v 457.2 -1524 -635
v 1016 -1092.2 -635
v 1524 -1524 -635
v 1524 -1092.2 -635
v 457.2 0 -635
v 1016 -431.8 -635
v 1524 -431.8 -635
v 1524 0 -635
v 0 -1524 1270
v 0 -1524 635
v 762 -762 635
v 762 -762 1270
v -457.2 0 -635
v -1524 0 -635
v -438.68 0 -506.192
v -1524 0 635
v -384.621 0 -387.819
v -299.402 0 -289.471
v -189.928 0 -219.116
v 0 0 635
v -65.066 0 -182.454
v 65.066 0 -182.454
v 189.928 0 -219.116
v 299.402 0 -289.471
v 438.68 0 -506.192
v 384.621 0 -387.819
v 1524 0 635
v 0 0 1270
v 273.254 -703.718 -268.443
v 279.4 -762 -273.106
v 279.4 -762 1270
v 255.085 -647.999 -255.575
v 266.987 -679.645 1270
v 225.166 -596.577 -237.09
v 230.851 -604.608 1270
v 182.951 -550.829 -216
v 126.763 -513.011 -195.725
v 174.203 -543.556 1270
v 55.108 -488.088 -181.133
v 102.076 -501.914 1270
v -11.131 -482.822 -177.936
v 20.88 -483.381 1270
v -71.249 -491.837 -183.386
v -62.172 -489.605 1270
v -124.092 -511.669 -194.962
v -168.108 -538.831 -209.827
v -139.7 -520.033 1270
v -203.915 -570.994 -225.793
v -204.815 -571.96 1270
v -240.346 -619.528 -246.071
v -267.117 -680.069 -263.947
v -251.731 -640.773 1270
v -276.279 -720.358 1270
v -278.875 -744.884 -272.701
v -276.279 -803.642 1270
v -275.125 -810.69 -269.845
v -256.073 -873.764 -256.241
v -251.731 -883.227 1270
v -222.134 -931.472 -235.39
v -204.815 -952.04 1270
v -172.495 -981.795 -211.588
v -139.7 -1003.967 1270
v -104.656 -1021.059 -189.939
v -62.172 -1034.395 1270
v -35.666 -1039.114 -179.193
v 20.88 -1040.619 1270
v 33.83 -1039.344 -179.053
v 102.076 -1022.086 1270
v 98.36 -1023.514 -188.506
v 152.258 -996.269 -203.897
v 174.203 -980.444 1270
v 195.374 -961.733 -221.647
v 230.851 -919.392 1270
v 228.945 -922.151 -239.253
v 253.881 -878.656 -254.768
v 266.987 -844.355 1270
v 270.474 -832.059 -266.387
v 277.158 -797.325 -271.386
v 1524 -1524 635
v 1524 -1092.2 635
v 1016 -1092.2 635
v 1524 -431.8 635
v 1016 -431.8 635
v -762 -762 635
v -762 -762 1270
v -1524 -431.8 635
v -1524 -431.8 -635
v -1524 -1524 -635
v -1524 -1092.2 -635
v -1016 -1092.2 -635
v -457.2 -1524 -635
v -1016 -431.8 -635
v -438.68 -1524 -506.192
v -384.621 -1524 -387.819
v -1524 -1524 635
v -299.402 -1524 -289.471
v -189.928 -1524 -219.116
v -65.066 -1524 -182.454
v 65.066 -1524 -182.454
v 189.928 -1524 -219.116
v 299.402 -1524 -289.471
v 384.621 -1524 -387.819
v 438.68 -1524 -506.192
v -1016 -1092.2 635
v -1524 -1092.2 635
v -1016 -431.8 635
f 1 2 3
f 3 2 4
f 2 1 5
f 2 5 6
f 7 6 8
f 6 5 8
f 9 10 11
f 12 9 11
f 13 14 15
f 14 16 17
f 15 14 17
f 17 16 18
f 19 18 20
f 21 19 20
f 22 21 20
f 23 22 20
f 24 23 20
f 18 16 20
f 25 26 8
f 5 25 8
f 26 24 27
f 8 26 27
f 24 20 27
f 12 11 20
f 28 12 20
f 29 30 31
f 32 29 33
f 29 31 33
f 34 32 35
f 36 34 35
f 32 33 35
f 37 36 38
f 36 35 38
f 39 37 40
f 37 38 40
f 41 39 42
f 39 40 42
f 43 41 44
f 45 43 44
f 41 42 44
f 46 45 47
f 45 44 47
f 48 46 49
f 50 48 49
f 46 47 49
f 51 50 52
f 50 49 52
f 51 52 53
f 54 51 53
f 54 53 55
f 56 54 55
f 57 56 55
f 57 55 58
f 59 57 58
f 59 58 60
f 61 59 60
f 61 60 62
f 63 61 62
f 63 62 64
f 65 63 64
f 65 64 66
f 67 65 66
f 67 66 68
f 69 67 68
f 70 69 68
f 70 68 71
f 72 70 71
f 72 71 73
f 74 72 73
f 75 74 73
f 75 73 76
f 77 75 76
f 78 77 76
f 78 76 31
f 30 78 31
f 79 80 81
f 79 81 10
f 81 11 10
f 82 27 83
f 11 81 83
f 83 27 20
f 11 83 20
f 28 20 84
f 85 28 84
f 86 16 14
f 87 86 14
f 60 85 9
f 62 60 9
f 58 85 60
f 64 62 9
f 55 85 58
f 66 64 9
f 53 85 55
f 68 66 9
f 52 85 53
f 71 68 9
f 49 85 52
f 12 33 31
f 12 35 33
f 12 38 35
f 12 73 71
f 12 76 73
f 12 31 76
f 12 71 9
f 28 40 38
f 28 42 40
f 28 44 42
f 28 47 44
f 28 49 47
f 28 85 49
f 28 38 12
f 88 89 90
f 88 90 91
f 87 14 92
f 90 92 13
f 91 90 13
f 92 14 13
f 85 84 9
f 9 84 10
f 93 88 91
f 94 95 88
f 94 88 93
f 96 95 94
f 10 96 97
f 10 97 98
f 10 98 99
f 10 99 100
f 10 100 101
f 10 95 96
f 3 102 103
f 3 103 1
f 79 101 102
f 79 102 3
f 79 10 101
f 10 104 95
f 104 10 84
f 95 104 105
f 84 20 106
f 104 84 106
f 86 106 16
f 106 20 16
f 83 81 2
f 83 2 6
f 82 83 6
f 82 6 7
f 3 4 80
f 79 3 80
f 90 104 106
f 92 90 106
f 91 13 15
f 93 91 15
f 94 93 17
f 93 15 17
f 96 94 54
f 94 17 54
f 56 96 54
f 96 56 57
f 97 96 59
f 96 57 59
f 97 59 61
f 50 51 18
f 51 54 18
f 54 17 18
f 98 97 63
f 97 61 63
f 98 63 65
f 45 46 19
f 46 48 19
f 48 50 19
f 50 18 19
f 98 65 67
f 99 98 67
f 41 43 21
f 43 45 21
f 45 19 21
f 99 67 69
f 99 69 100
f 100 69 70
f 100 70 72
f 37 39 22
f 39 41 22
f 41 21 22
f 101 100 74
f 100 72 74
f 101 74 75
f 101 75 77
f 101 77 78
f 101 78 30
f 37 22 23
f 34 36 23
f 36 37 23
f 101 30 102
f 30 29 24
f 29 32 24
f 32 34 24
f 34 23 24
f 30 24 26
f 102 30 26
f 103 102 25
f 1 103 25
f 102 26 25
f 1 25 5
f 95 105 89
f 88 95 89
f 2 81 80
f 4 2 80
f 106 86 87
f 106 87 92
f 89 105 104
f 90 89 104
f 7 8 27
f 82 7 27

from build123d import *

# Parameters (mm, degrees)
F1_DEPTH  = 1524
F2_W      = 508
F2_H      = 660.4
F3_DEPTH  = 25.4
F3_FACE_W = 508
F3_FACE_H = 660.4
F4_DEPTH  = 1295.401
F6_DEPTH  = 635
F7_R      = 279.4
F8_DEPTH  = 1905.001


with BuildPart() as f1:
    # F0 (on Front) → F1 (new body)
    with BuildSketch(Plane.XZ):
        with BuildLine():
            Line((-1524, 635), (-1524, -635))
            Line((-1524, -635), (-457.2, -635))
            ThreePointArc((-457.2, -635), (0, -177.8), (457.2, -635))
            Line((457.2, -635), (1524, -635))
            Line((1524, -635), (1524, 635))
            Line((1524, 635), (-1524, 635))
        make_face()
    extrude(amount=F1_DEPTH)

    # F2 (on face) → F3 (join)
    with BuildSketch(Plane.XY.offset(635)):
        with Locations((-1270, -762)):
            Rectangle(F2_W, F2_H)
        with Locations((1270, -762)):
            Rectangle(F2_W, F2_H)
    extrude(amount=F3_DEPTH)

    # F3_face (on face) → F4 (cut, through all)
    with BuildSketch(Plane(origin=(-1270, -762, 660.4), x_dir=(1, 0, 0), z_dir=(0, 0, 1))):
        Rectangle(F3_FACE_W, F3_FACE_H)
        with Locations((2540, 0)):
            Rectangle(F3_FACE_W, F3_FACE_H)
    extrude(amount=-F4_DEPTH, mode=Mode.SUBTRACT)

    # F5 (on face) → F6 (join)
    with BuildSketch(Plane.XY.offset(635)):
        Polygon((762, -762), (0, 0), (-762, -762), (0, -1524), align=None)
    extrude(amount=F6_DEPTH)

    # F7 (on face) → F8 (cut, through all)
    with BuildSketch(Plane.XY.offset(1270)):
        with Locations((0, -762)):
            Circle(F7_R)
    extrude(amount=-F8_DEPTH, mode=Mode.SUBTRACT)


solid = f1.part
